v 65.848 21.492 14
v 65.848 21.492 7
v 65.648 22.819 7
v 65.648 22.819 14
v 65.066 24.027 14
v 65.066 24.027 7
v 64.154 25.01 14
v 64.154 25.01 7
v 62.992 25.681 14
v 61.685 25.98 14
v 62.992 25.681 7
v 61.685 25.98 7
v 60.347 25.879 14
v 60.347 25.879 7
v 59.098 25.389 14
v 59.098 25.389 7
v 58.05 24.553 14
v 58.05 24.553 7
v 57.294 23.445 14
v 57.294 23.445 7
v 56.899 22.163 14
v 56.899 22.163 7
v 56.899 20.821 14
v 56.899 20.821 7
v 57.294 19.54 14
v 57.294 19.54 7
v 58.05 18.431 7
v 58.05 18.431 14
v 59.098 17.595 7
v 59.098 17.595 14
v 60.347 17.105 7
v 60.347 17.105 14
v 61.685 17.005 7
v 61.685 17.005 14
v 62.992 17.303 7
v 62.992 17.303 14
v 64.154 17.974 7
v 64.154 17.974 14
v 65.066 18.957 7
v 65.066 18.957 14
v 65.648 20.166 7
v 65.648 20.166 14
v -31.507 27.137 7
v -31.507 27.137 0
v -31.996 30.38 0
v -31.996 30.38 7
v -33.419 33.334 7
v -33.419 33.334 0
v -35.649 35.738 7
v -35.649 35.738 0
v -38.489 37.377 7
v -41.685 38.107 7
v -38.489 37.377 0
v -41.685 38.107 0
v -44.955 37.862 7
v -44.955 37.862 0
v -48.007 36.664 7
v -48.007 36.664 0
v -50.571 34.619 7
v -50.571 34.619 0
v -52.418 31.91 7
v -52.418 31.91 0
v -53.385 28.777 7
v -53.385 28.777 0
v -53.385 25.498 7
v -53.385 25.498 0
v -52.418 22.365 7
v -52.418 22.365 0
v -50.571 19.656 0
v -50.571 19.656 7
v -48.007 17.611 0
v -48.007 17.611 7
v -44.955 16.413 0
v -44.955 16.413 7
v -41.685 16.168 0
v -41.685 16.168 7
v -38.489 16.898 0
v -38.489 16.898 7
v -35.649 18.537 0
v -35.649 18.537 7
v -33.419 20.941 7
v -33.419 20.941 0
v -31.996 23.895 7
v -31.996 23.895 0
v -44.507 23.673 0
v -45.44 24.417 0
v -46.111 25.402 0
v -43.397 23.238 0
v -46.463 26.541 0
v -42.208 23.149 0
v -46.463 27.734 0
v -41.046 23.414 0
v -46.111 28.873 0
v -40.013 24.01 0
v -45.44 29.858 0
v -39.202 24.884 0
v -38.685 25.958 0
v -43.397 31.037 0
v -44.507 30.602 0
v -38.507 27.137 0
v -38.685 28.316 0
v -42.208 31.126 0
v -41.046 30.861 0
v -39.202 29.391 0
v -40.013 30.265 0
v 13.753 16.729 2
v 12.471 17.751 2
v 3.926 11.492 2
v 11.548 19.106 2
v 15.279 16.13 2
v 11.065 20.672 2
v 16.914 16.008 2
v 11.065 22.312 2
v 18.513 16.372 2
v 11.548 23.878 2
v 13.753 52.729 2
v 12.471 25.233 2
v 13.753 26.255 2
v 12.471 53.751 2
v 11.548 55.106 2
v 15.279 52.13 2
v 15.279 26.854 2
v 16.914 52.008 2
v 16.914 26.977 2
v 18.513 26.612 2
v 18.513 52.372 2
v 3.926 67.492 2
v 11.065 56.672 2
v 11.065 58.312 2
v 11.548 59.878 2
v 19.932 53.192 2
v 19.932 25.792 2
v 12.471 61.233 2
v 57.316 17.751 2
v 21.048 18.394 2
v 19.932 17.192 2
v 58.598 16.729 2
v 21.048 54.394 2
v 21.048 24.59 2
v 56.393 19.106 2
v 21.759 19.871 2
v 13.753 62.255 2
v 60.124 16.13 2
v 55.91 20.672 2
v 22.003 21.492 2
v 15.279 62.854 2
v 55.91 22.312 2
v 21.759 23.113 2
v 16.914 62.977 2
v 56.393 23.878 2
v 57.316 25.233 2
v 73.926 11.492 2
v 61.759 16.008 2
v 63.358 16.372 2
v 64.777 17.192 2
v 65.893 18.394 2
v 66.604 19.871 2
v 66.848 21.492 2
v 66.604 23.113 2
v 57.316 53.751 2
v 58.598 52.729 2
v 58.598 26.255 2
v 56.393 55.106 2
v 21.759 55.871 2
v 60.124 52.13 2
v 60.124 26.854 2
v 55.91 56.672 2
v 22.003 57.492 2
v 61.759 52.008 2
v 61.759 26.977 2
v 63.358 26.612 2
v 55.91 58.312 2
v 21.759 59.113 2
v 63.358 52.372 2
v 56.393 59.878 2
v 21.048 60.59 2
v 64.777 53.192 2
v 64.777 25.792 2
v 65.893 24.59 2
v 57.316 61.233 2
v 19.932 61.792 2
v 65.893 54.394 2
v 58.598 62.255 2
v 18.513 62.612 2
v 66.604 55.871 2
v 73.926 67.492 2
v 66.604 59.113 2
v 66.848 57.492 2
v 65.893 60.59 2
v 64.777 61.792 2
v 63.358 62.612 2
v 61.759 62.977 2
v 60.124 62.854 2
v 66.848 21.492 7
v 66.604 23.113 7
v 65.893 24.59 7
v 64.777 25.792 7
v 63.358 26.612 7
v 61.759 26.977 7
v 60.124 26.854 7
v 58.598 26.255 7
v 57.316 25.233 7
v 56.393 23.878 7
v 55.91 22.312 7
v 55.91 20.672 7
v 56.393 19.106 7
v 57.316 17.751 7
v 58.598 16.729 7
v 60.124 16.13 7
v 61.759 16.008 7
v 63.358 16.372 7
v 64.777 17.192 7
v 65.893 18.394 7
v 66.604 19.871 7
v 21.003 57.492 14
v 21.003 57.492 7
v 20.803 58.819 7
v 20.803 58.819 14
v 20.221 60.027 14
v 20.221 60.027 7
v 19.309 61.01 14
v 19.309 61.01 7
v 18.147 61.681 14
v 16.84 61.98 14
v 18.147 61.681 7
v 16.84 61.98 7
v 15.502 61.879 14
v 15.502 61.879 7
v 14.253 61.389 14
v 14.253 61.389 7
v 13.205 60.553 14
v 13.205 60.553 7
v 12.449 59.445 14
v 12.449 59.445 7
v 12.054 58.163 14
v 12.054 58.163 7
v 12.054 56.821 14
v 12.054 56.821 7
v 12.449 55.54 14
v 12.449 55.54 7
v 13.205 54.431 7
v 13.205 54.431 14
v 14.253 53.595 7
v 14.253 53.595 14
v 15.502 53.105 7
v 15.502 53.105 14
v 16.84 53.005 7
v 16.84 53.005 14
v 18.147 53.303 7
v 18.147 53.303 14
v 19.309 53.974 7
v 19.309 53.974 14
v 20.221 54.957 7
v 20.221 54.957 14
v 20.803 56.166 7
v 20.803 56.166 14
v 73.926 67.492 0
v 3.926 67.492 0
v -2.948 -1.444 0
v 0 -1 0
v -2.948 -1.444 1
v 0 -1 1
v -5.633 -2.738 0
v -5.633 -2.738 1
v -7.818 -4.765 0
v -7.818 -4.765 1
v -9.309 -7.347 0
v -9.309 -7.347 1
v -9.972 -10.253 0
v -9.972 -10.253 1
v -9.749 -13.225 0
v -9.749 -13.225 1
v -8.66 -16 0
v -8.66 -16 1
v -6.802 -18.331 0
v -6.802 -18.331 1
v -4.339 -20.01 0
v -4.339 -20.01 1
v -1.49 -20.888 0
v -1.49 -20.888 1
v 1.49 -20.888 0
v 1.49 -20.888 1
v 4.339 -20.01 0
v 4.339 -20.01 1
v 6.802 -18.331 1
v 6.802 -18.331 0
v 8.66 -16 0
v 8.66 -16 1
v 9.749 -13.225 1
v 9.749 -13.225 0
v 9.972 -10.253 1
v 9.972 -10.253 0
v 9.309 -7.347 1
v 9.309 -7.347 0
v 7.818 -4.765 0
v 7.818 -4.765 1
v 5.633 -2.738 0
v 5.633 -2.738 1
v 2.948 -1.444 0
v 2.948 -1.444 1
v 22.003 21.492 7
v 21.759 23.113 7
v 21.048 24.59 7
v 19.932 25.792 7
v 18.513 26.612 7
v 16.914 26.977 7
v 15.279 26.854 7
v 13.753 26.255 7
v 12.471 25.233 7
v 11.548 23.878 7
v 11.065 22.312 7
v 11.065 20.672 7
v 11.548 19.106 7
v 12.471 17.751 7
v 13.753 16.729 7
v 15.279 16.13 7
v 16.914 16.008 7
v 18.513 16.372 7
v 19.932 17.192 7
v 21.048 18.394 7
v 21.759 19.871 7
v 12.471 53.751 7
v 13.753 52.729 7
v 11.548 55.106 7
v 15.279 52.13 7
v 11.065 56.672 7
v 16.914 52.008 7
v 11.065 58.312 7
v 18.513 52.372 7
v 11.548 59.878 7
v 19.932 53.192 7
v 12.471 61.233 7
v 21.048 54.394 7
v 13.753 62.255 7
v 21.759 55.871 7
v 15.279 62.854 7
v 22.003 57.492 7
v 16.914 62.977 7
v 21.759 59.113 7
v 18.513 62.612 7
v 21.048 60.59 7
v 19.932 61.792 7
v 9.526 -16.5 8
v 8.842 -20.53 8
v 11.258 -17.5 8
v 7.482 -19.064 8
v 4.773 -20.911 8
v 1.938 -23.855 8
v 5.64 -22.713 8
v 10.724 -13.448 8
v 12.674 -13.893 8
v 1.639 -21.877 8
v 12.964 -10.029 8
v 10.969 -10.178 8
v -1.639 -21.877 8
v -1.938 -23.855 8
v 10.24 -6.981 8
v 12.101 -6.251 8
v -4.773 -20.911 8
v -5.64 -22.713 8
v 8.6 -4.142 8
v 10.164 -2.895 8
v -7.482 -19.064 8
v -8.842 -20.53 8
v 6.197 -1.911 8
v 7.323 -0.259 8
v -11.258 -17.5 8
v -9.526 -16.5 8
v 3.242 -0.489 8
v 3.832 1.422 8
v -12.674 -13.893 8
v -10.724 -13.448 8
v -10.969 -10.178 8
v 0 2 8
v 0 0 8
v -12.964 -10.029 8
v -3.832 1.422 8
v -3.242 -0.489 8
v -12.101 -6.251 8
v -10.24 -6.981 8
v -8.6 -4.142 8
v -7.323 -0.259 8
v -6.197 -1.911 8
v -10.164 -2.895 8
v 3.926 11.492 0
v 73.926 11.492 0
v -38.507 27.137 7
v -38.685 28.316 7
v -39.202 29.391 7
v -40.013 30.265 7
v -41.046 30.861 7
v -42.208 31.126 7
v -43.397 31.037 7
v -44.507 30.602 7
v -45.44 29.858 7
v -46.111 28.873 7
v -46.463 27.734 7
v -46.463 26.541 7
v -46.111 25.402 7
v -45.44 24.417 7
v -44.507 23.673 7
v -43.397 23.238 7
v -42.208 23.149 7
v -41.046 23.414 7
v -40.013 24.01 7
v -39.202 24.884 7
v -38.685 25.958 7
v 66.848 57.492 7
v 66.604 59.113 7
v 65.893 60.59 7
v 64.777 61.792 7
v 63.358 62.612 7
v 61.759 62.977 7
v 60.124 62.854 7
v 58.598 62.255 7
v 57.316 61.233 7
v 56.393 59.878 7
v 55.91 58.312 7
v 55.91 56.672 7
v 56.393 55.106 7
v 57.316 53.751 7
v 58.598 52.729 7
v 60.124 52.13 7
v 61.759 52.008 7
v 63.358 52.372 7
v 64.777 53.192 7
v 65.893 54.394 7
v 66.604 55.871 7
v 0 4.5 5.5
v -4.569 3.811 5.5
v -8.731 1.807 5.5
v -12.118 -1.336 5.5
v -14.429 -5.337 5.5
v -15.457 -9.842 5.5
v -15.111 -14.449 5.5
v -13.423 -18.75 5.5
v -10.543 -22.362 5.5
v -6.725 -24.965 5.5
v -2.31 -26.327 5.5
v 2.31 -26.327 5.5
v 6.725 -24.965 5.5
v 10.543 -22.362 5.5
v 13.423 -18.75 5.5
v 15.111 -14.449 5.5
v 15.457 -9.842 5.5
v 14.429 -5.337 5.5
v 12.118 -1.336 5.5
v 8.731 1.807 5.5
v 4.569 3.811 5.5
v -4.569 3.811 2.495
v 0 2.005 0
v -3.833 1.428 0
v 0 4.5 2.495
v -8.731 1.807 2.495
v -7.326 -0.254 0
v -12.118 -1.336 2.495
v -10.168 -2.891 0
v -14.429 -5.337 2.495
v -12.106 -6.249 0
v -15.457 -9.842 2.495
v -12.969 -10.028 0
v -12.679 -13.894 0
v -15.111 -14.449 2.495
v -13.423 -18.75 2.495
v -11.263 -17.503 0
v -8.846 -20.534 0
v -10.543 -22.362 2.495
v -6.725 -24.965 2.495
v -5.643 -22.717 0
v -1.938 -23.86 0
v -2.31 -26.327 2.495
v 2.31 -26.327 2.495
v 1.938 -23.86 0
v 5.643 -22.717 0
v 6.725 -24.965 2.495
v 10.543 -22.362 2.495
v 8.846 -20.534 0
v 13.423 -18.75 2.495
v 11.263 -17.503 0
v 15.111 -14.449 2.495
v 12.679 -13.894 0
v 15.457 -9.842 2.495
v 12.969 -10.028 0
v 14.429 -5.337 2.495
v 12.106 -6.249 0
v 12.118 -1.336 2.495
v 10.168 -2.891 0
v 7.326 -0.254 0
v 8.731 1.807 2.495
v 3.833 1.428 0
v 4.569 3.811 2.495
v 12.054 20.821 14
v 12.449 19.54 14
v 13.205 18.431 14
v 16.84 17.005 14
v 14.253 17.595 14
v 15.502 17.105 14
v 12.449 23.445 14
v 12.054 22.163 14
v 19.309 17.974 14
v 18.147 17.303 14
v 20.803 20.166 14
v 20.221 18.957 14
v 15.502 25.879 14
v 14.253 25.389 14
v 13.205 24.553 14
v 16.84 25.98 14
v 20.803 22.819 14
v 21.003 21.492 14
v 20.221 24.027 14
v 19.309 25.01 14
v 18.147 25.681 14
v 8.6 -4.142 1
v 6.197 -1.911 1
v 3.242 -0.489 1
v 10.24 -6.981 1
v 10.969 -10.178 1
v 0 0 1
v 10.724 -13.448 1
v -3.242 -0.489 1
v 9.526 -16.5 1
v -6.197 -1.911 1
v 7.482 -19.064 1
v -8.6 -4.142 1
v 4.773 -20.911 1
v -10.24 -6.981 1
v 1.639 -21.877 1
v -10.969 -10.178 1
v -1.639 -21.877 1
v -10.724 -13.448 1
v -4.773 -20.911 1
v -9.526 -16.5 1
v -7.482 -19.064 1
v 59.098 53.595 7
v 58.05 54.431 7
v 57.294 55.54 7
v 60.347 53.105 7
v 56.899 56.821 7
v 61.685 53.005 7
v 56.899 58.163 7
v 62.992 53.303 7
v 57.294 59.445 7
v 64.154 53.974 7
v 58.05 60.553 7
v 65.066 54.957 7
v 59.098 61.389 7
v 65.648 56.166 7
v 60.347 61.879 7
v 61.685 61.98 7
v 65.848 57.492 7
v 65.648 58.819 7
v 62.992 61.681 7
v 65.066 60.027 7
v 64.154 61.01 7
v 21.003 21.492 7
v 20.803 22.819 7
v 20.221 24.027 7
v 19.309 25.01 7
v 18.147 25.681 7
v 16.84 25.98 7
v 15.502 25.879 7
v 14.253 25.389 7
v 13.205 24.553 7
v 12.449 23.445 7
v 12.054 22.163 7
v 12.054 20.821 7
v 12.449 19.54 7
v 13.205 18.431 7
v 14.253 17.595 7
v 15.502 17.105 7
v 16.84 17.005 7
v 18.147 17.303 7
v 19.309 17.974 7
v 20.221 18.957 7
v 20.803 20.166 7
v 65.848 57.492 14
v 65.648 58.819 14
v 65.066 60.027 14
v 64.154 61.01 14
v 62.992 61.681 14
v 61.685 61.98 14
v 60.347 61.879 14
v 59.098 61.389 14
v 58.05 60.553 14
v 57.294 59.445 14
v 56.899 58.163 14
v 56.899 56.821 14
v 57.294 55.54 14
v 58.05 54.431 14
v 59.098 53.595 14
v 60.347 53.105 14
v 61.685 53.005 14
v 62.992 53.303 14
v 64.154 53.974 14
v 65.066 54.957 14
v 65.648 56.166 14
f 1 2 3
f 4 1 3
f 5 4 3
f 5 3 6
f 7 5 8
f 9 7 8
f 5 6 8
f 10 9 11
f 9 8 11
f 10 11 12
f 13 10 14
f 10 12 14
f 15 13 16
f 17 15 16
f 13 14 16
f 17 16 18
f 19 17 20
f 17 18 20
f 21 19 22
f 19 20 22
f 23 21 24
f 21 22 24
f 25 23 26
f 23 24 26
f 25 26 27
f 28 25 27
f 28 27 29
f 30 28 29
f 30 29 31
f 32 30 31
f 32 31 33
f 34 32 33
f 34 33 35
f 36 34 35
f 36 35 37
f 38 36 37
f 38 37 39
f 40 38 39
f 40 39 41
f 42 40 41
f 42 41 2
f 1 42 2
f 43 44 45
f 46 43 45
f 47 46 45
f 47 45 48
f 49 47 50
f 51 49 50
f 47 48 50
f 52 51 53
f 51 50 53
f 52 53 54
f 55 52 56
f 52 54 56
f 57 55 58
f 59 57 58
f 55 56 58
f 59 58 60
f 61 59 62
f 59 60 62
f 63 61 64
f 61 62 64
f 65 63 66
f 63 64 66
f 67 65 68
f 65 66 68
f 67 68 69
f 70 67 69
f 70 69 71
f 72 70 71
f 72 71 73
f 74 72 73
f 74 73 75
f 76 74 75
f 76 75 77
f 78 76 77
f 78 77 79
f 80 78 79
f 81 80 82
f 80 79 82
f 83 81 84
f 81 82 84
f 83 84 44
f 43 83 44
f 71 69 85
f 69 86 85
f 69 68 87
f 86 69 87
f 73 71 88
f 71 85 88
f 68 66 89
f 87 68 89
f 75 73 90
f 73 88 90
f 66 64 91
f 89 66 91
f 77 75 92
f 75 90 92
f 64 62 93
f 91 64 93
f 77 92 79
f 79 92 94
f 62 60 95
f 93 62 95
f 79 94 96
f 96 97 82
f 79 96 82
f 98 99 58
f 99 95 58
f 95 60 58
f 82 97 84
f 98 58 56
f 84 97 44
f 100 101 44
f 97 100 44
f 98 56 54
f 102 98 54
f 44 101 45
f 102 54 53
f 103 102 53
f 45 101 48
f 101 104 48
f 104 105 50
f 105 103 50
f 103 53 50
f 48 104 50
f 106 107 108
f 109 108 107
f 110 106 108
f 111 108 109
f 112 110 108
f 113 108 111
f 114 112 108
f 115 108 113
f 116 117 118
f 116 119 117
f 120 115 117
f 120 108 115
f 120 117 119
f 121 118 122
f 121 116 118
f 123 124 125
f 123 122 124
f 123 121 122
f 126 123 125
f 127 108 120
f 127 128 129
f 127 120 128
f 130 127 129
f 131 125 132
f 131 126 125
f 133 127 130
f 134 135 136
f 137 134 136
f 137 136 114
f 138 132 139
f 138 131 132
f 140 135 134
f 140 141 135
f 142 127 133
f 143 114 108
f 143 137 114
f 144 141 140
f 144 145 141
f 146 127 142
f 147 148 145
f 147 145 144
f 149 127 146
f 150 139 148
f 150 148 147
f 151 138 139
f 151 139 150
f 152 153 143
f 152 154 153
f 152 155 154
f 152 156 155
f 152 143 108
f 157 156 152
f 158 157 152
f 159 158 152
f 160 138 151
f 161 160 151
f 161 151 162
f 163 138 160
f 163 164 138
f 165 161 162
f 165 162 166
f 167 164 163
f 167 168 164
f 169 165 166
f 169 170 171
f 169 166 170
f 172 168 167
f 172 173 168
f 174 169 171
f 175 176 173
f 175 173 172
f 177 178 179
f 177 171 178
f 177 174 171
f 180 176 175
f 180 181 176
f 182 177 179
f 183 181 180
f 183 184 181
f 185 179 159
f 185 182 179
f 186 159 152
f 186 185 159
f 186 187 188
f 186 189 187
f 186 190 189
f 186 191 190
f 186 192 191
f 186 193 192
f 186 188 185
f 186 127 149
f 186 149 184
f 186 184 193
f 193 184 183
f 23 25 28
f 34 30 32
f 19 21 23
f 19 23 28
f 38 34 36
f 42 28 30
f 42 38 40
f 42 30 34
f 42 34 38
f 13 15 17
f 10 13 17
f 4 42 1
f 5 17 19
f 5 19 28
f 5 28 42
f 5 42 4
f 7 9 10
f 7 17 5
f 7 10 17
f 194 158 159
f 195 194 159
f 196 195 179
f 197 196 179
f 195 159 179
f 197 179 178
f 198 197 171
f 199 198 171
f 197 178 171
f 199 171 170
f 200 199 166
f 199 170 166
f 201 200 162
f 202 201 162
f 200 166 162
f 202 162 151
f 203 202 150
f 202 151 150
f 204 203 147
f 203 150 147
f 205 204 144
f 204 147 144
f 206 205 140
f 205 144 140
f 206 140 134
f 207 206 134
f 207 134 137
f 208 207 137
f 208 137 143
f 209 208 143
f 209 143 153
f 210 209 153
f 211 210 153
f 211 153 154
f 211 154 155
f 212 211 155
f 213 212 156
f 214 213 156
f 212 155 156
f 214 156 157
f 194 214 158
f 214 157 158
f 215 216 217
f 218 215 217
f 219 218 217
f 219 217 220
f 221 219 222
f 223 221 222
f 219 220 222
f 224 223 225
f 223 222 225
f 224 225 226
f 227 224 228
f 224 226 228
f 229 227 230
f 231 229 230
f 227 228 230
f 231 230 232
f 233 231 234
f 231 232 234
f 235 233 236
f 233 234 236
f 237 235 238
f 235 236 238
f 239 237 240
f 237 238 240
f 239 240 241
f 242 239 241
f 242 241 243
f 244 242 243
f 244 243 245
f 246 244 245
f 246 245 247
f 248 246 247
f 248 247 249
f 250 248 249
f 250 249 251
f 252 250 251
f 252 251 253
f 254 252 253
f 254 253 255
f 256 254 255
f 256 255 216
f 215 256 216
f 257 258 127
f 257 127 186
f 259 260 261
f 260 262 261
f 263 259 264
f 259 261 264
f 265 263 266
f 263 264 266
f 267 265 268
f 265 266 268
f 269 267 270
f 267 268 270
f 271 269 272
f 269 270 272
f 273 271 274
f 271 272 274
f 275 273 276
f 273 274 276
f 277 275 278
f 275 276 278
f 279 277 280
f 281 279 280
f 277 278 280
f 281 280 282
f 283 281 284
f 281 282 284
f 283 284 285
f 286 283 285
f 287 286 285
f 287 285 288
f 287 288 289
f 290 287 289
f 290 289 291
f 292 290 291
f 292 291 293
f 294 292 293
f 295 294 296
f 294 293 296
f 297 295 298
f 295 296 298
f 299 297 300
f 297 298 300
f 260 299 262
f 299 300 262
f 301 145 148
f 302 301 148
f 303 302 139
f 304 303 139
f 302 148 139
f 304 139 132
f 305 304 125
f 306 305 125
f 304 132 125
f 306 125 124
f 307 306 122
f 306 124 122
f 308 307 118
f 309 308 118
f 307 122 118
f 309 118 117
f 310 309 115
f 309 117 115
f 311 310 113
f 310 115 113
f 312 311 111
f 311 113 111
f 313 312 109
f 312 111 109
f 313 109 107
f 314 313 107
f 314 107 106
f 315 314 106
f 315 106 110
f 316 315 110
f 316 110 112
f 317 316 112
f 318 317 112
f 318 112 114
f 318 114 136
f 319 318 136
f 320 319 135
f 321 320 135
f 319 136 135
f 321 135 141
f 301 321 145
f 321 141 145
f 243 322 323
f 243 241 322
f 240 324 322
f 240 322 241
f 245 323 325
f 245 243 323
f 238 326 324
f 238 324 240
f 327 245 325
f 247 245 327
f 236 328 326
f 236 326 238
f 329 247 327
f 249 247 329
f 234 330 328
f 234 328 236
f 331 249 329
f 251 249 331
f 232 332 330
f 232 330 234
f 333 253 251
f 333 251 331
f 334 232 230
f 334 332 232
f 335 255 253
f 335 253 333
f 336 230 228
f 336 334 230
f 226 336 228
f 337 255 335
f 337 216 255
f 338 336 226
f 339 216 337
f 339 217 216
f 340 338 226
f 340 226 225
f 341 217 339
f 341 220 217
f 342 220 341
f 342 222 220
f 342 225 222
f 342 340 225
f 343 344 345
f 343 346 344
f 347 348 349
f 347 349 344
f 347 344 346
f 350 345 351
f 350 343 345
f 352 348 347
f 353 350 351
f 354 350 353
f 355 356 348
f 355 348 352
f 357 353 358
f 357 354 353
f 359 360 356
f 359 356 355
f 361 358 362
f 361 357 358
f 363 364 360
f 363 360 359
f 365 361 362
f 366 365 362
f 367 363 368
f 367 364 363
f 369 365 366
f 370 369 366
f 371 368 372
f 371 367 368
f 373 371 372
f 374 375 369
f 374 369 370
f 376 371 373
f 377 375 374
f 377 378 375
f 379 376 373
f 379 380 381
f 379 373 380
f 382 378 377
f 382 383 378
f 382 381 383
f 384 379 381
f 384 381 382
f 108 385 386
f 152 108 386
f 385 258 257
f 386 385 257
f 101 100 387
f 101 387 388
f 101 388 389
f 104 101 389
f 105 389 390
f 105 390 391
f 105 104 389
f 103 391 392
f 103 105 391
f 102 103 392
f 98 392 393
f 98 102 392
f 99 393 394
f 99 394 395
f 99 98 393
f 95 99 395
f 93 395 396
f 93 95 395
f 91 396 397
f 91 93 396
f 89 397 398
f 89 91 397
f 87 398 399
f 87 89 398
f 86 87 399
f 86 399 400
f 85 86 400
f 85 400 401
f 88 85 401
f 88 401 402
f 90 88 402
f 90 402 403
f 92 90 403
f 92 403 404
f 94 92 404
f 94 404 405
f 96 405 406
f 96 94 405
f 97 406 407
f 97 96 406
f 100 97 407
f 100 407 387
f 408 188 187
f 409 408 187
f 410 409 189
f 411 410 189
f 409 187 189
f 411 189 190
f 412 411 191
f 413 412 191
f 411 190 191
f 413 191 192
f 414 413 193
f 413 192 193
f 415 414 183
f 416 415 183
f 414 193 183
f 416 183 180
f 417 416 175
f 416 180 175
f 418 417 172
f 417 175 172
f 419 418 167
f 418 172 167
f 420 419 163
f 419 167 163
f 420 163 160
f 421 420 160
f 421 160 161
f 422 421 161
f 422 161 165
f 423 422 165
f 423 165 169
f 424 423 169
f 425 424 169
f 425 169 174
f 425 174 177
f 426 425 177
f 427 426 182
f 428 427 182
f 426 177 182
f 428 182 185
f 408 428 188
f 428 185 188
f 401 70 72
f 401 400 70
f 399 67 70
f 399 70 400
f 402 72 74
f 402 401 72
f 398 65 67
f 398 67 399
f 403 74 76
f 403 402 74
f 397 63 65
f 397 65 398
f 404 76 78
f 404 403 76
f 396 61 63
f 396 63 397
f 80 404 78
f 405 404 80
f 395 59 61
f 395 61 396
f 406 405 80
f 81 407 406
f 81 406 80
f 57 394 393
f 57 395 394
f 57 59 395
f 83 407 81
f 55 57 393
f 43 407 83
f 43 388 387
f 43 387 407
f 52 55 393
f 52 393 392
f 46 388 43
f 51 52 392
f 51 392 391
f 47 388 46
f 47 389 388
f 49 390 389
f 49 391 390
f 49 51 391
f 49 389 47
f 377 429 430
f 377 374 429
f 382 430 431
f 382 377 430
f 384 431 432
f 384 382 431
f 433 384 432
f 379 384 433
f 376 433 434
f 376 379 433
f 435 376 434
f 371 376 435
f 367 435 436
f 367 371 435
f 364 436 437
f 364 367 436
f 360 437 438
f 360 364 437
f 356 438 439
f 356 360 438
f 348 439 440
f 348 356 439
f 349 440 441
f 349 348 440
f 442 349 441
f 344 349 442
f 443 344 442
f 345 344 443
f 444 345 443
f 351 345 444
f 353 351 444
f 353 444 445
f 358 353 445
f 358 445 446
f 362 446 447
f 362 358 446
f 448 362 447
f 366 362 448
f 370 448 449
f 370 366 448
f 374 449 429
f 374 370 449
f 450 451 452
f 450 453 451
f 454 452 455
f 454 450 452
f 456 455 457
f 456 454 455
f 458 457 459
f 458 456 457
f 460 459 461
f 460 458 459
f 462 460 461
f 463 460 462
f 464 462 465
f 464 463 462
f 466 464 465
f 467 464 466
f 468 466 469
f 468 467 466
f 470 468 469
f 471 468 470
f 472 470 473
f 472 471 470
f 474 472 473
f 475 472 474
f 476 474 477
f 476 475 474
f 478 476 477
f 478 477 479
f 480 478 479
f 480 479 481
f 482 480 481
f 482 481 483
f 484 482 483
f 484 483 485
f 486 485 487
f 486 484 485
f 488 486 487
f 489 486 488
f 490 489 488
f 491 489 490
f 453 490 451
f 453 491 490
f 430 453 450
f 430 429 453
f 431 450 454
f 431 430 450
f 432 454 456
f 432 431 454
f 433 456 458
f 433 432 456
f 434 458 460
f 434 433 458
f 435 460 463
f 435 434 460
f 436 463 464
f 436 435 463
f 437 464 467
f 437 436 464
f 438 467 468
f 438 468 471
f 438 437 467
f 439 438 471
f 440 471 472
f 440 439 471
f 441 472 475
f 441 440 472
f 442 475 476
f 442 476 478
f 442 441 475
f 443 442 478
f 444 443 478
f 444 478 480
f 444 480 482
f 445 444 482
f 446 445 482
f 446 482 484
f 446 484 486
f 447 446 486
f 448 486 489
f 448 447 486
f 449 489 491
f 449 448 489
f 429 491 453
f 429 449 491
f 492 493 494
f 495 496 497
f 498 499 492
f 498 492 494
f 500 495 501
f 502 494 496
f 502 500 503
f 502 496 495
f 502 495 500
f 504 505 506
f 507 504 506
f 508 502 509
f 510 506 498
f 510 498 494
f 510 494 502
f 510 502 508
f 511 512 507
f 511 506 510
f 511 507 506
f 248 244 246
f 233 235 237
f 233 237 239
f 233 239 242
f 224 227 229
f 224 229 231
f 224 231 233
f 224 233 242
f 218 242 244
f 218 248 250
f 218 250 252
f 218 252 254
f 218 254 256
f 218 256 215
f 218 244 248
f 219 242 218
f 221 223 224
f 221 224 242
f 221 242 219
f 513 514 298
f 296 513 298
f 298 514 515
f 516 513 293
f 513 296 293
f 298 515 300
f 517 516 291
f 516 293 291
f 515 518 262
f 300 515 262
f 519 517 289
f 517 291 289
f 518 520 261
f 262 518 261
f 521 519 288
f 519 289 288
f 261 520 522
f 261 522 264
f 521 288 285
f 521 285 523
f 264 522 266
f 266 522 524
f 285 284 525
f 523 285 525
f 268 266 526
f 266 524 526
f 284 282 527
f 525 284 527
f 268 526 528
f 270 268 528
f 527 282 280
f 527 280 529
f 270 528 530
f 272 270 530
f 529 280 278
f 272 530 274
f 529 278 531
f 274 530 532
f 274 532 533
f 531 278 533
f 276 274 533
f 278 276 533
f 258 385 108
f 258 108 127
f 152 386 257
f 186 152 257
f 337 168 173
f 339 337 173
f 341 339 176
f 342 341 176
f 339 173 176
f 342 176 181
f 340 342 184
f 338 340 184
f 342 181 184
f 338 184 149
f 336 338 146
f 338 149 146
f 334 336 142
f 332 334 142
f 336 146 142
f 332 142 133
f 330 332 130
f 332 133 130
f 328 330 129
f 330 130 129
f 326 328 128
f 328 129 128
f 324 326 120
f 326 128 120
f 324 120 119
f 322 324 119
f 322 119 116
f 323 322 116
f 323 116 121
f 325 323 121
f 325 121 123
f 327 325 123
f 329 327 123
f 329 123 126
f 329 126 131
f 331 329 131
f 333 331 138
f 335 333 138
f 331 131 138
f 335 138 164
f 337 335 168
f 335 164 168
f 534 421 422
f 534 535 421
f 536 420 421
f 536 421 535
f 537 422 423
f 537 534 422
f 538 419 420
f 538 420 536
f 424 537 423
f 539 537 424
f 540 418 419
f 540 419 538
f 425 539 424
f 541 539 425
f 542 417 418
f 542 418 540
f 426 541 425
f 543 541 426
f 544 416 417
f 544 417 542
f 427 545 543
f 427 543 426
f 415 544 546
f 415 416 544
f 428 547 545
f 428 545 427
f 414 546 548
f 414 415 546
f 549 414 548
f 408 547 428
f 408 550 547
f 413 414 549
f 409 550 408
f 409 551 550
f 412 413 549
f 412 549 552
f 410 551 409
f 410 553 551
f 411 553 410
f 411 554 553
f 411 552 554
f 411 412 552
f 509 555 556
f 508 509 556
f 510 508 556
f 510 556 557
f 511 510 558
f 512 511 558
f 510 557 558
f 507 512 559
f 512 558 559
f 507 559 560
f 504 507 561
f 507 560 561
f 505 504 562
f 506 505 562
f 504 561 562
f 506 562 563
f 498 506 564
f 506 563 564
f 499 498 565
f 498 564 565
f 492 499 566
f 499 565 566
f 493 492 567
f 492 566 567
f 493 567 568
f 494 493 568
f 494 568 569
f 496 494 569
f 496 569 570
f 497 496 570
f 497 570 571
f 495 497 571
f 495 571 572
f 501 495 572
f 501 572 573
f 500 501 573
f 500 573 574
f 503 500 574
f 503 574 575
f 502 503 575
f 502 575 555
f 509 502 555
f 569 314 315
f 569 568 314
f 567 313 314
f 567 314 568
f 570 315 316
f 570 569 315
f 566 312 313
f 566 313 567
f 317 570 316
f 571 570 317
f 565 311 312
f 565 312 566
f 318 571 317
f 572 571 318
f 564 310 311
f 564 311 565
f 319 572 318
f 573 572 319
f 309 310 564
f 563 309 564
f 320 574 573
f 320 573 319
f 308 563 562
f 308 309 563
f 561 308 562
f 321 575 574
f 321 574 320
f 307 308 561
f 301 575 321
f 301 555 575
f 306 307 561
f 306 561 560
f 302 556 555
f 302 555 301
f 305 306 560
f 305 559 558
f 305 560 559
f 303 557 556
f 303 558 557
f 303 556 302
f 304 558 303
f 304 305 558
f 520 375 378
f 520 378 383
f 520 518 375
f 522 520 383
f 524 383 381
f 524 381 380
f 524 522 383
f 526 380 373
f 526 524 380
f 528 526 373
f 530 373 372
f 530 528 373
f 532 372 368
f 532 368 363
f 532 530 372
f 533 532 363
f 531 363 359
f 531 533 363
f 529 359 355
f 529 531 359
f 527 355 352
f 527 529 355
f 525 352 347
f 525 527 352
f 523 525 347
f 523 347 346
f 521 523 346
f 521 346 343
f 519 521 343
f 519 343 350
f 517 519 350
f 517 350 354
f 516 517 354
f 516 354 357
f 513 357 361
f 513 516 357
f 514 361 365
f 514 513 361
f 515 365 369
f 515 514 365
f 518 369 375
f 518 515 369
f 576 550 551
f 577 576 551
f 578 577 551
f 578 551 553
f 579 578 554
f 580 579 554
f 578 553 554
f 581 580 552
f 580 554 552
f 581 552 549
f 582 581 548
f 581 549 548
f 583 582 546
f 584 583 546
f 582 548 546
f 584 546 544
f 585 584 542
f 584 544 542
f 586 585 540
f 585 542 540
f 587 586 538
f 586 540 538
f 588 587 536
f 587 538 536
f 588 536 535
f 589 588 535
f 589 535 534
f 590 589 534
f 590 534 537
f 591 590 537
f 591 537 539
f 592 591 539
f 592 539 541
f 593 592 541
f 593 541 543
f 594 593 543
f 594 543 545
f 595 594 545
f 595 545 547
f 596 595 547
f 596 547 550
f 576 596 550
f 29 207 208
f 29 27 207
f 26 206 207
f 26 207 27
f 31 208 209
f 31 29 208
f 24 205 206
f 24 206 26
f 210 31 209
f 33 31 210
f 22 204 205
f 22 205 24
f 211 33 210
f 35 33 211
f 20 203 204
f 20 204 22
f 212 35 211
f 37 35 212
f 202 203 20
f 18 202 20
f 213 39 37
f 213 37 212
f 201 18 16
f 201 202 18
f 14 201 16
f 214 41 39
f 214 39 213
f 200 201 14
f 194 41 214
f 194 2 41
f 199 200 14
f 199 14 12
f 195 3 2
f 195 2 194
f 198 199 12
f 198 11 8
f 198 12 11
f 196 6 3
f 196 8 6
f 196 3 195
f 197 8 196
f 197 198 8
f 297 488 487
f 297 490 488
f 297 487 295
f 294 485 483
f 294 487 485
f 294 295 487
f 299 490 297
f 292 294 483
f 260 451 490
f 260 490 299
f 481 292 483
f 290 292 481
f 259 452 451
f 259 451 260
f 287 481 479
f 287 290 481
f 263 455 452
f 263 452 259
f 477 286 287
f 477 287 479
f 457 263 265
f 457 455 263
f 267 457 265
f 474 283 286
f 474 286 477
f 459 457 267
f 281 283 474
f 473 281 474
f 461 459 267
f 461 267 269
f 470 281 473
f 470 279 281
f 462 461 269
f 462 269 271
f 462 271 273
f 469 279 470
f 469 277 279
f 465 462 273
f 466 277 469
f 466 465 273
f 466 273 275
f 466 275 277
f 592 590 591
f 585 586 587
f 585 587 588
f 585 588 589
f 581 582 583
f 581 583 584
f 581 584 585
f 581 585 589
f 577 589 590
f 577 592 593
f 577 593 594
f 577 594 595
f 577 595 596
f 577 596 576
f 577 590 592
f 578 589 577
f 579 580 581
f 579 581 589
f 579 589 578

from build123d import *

# Parameters (mm, degrees)
F0_W     = 1
F0_H     = 1
F2_R     = 11
F2_R_2   = 4
F3_DEPTH = 7
F4_W     = 70
F4_H     = 56
F5_DEPTH = 2
F6_R     = 4.5
F7_DEPTH = 12
F6_R_2   = 5.5
F8_DEPTH = 5


with BuildPart() as f1:
    # F0 (on Right) → F1 (revolve)
    with BuildSketch(Plane.YZ):
        Polygon((0, 1), (0, 0), (2.005399, 0), (4.5, 2.494601), (4.5, 5.5), (2, 8), (0, 8), align=None)
        with Locations((-0.5, 0.5)):
            Rectangle(F0_W, F0_H)
    revolve(axis=Axis((0, -11, 2.9925), (0, 0, 1)))


with BuildPart() as f3:
    # F2 (on Top) → F3 (new body)
    with BuildSketch(Plane.XY):
        with Locations((-42.507384, 27.137408)):
            Circle(F2_R)
        with Locations((-42.507384, 27.137408)):
            Circle(F2_R_2, mode=Mode.SUBTRACT)
    extrude(amount=F3_DEPTH)


with BuildPart() as f5:
    # F4 (on Top) → F5 (new body)
    with BuildSketch(Plane.XY):
        with Locations((38.925769, 39.492126)):
            Rectangle(F4_W, F4_H)
    extrude(amount=F5_DEPTH)

    # F6 (on face) → F7 (join)
    with BuildSketch(Plane.XY.offset(2)):
        with Locations((61.348269, 21.492126)):
            Circle(F6_R)
        with Locations((16.503269, 21.492126)):
            Circle(F6_R)
        with Locations((16.503269, 57.492126)):
            Circle(F6_R)
        with Locations((61.348269, 57.492126)):
            Circle(F6_R)
    extrude(amount=F7_DEPTH)

    # F6 (on face) → F8 (join)
    with BuildSketch(Plane.XY.offset(2)):
        with Locations((61.348269, 21.492126)):
            Circle(F6_R_2)
        with Locations((61.348269, 21.492126)):
            Circle(F6_R, mode=Mode.SUBTRACT)
        with Locations((16.503269, 21.492126)):
            Circle(F6_R_2)
        with Locations((16.503269, 21.492126)):
            Circle(F6_R, mode=Mode.SUBTRACT)
        with Locations((61.348269, 57.492126)):
            Circle(F6_R_2)
        with Locations((61.348269, 57.492126)):
            Circle(F6_R, mode=Mode.SUBTRACT)
        with Locations((16.503269, 57.492126)):
            Circle(F6_R_2)
        with Locations((16.503269, 57.492126)):
            Circle(F6_R, mode=Mode.SUBTRACT)
    extrude(amount=F8_DEPTH)


solid = Compound([f1.part, f3.part, f5.part])
